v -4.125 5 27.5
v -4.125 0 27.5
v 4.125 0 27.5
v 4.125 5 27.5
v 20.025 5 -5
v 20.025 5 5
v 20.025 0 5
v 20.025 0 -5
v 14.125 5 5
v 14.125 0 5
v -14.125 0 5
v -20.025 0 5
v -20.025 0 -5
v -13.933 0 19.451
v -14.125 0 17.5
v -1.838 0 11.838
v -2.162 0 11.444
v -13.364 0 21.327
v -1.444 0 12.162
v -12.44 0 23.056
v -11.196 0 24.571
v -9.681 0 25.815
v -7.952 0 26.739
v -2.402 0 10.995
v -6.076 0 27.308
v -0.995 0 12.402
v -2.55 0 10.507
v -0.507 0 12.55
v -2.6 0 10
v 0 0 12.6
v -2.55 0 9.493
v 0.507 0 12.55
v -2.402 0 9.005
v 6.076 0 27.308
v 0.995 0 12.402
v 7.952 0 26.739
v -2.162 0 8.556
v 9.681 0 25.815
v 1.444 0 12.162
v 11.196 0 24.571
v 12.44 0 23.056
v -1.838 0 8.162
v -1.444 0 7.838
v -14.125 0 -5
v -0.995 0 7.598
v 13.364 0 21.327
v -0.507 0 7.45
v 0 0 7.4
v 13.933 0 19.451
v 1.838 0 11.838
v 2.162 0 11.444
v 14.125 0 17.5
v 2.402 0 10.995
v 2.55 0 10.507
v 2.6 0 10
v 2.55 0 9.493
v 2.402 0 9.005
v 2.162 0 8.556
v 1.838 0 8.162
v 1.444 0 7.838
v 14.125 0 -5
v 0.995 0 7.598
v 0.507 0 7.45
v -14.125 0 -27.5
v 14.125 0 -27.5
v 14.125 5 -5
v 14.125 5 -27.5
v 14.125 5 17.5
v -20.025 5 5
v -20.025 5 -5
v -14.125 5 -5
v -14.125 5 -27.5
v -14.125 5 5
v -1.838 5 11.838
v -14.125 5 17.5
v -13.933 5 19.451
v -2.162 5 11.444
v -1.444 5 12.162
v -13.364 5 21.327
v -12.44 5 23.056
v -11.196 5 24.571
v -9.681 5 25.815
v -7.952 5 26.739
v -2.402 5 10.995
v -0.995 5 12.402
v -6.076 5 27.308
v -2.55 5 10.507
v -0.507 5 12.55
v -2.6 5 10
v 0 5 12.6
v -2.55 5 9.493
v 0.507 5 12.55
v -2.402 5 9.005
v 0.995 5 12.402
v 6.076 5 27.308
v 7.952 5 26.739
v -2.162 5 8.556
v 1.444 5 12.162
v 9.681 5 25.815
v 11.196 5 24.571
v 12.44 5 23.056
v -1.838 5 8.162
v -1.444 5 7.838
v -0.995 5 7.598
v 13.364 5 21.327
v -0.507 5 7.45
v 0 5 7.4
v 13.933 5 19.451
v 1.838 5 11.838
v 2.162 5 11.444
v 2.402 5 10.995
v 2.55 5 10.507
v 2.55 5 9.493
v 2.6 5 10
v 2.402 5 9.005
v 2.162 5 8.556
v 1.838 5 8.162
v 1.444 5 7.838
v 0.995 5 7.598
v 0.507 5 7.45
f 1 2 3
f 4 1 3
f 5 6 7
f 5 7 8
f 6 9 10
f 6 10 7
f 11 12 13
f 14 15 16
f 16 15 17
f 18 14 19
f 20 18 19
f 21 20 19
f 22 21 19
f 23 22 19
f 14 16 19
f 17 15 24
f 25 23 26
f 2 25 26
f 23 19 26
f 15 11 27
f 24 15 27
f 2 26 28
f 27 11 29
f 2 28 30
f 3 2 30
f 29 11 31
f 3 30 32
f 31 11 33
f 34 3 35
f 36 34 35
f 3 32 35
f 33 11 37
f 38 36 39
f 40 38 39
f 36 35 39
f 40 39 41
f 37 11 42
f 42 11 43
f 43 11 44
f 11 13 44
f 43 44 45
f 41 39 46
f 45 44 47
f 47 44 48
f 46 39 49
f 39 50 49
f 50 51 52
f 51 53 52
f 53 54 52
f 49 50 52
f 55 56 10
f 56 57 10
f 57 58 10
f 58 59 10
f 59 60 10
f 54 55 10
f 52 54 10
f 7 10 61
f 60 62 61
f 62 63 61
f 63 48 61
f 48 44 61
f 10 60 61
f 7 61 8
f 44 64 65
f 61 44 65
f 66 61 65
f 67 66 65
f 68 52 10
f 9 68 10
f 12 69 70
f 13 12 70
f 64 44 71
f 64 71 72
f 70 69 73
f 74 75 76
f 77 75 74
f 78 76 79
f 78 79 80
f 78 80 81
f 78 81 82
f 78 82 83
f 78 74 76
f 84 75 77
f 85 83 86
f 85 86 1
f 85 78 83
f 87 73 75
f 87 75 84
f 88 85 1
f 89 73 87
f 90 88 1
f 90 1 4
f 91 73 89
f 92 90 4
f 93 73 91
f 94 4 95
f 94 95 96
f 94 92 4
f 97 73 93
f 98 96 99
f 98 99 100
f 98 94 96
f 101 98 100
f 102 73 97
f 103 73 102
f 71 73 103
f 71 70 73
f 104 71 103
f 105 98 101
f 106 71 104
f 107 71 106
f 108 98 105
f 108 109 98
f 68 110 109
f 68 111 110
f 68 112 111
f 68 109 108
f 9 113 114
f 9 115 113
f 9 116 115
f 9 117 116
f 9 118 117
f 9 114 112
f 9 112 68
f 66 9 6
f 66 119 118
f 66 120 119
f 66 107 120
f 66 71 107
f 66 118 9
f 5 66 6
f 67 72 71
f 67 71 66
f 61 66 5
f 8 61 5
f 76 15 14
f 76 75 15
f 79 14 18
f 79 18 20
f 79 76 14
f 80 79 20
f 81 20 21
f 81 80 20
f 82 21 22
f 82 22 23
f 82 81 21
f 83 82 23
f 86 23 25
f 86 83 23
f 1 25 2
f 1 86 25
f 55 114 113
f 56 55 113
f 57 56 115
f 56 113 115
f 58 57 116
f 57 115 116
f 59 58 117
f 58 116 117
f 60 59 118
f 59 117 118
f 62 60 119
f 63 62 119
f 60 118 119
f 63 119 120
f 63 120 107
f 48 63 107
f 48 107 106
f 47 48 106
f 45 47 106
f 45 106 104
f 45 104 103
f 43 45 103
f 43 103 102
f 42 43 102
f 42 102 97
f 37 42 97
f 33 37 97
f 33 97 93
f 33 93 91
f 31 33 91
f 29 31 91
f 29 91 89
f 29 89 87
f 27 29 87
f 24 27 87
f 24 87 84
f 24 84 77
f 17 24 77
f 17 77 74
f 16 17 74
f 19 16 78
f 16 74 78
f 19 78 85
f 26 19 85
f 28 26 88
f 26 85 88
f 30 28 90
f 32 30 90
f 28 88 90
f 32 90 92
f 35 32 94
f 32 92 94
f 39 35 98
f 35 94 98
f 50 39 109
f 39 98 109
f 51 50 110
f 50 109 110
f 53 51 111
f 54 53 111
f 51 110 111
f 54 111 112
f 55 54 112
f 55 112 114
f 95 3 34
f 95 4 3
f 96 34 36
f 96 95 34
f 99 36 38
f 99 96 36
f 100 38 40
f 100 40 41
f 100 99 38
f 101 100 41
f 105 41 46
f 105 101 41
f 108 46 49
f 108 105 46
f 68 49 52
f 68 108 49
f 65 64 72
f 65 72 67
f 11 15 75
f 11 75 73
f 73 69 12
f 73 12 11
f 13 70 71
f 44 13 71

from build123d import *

# Parameters (mm, degrees)
SKETCH1_W           = 28.25
SKETCH1_H           = 55
BOSS_EXTRUDE1_DEPTH = 5
SKETCH3_W           = 5.9
SKETCH3_H           = 10
BOSS_EXTRUDE2_DEPTH = 5
SKETCH2_R           = 2.6
CUT_EXTRUDE1_DEPTH  = 10
FILLET1_R           = 10


with BuildPart() as part:
    # Sketch1 → Boss-Extrude1 (new body)
    with BuildSketch(Plane(origin=(0, 0, 0), x_dir=(1, 0, 0), z_dir=(0, 1, 0))):
        Rectangle(SKETCH1_W, SKETCH1_H)
    extrude(amount=BOSS_EXTRUDE1_DEPTH)

    # Sketch3 → Boss-Extrude2 (add)
    with BuildSketch(Plane(origin=(0, 5, 0), x_dir=(1, 0, 0), z_dir=(0, 1, 0))):
        with Locations((-17.075, 0)):
            Rectangle(SKETCH3_W, SKETCH3_H)
        with Locations((17.075, 0)):
            Rectangle(SKETCH3_W, SKETCH3_H)
    extrude(amount=-BOSS_EXTRUDE2_DEPTH)

    # Sketch2 → Cut-Extrude1 (cut)
    with BuildSketch(Plane(origin=(0, 5, 0), x_dir=(1, 0, 0), z_dir=(0, 1, 0))):
        with Locations((0, -10)):
            Circle(SKETCH2_R)
    extrude(amount=-CUT_EXTRUDE1_DEPTH, mode=Mode.SUBTRACT)

    # Fillet1
    fillet1_edges = [part.edges().sort_by_distance(p)[0] for p in [
        (14.125, 2.5, 27.5),
        (-14.125, 2.5, 27.5),
    ]]
    fillet(fillet1_edges, radius=FILLET1_R)


solid = part.part
